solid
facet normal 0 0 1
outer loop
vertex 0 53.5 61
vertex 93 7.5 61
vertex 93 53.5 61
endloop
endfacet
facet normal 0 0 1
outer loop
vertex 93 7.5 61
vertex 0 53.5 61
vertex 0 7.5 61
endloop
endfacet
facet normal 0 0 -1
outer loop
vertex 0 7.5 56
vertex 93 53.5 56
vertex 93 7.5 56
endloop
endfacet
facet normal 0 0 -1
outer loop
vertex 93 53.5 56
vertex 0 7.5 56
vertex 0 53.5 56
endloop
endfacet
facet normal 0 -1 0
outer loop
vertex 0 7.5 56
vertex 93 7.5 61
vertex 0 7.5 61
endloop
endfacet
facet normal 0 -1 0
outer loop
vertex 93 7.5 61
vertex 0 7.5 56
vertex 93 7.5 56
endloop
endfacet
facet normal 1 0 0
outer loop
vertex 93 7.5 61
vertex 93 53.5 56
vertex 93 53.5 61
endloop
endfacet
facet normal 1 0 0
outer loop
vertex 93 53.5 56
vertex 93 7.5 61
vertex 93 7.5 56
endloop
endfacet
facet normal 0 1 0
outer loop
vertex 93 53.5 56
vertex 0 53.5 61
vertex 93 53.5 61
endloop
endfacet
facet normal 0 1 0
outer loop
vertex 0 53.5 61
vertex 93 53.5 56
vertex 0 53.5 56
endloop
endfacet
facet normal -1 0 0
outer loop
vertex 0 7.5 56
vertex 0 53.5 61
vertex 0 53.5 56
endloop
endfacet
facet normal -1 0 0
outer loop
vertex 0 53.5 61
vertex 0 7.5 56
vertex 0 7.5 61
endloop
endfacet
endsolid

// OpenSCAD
pcb_w = 56;
pcb_l = 93;

coil_w = 2;
coil_h = 33;
coil_l = 43;

rfid_l = 42;
rfid_w = 24;

module rounded_cube(sx,sy,sz,r) 
{
	union()
	{
		translate([r,r,0]) cube([sx-2*r,sy-2*r,sz],false);
		translate([r,0,r]) cube([sx-2*r,sy,sz-2*r],false);
		translate([0,r,r]) cube([sx,sy-2*r,sz-2*r],false);

		translate([r,r,r]) rotate(a=[0,90,0]) cylinder(h=sx-2*r,r=r,center=false);
		translate([r,sy-r,r]) rotate(a=[0,90,0]) cylinder(h=sx-2*r,r=r,center=false);
		translate([r,r,sz-r]) rotate(a=[0,90,0]) cylinder(h=sx-2*r,r=r,center=false);
		translate([r,sy-r,sz-r]) rotate(a=[0,90,0]) cylinder(h=sx-2*r,r=r,center=false);

		translate([r,r,r]) rotate(a=[0,0,0]) cylinder(h=sz-2*r,r=r,center=false);
		translate([r,sy-r,r]) rotate(a=[0,0,0]) cylinder(h=sz-2*r,r=r,center=false);
		translate([sx-r,r,r]) rotate(a=[0,0,0]) cylinder(h=sz-2*r,r=r,center=false);
		translate([sx-r,sy-r,r]) rotate(a=[0,0,0]) cylinder(h=sz-2*r,r=r,center=false);

		translate([r,r,r]) rotate(a=[-90,0,0]) cylinder(h=sy-2*r,r=r,center=false);
		translate([r,r,sz-r]) rotate(a=[-90,0,0]) cylinder(h=sy-2*r,r=r,center=false);
		translate([sx-r,r,r]) rotate(a=[-90,0,0]) cylinder(h=sy-2*r,r=r,center=false);
		translate([sx-r,r,sz-r]) rotate(a=[-90,0,0]) cylinder(h=sy-2*r,r=r,center=false);

		translate([r,r,r]) sphere(r);
		translate([r,sy-r,r]) sphere(r);
		translate([r,r,sz-r]) sphere(r);
		translate([r,sy-r,sz-r]) sphere(r);

		translate([sx-r,r,r]) sphere(r);
		translate([sx-r,sy-r,r]) sphere(r);
		translate([sx-r,r,sz-r]) sphere(r);
		translate([sx-r,sy-r,sz-r]) sphere(r);
	}
}

module base() {
  rounded_cube(pcb_l+25, pcb_w+5, pcb_w+5, 8);
}


module cover(r) {
  translate([0, 15/2, pcb_w])
  cube([pcb_l, pcb_w - 10, 5]);
}

module insides() {
  cube([coil_w, coil_l, coil_h]);
  cube([rfid_l, rfid_w, 5]);
}

cover();
